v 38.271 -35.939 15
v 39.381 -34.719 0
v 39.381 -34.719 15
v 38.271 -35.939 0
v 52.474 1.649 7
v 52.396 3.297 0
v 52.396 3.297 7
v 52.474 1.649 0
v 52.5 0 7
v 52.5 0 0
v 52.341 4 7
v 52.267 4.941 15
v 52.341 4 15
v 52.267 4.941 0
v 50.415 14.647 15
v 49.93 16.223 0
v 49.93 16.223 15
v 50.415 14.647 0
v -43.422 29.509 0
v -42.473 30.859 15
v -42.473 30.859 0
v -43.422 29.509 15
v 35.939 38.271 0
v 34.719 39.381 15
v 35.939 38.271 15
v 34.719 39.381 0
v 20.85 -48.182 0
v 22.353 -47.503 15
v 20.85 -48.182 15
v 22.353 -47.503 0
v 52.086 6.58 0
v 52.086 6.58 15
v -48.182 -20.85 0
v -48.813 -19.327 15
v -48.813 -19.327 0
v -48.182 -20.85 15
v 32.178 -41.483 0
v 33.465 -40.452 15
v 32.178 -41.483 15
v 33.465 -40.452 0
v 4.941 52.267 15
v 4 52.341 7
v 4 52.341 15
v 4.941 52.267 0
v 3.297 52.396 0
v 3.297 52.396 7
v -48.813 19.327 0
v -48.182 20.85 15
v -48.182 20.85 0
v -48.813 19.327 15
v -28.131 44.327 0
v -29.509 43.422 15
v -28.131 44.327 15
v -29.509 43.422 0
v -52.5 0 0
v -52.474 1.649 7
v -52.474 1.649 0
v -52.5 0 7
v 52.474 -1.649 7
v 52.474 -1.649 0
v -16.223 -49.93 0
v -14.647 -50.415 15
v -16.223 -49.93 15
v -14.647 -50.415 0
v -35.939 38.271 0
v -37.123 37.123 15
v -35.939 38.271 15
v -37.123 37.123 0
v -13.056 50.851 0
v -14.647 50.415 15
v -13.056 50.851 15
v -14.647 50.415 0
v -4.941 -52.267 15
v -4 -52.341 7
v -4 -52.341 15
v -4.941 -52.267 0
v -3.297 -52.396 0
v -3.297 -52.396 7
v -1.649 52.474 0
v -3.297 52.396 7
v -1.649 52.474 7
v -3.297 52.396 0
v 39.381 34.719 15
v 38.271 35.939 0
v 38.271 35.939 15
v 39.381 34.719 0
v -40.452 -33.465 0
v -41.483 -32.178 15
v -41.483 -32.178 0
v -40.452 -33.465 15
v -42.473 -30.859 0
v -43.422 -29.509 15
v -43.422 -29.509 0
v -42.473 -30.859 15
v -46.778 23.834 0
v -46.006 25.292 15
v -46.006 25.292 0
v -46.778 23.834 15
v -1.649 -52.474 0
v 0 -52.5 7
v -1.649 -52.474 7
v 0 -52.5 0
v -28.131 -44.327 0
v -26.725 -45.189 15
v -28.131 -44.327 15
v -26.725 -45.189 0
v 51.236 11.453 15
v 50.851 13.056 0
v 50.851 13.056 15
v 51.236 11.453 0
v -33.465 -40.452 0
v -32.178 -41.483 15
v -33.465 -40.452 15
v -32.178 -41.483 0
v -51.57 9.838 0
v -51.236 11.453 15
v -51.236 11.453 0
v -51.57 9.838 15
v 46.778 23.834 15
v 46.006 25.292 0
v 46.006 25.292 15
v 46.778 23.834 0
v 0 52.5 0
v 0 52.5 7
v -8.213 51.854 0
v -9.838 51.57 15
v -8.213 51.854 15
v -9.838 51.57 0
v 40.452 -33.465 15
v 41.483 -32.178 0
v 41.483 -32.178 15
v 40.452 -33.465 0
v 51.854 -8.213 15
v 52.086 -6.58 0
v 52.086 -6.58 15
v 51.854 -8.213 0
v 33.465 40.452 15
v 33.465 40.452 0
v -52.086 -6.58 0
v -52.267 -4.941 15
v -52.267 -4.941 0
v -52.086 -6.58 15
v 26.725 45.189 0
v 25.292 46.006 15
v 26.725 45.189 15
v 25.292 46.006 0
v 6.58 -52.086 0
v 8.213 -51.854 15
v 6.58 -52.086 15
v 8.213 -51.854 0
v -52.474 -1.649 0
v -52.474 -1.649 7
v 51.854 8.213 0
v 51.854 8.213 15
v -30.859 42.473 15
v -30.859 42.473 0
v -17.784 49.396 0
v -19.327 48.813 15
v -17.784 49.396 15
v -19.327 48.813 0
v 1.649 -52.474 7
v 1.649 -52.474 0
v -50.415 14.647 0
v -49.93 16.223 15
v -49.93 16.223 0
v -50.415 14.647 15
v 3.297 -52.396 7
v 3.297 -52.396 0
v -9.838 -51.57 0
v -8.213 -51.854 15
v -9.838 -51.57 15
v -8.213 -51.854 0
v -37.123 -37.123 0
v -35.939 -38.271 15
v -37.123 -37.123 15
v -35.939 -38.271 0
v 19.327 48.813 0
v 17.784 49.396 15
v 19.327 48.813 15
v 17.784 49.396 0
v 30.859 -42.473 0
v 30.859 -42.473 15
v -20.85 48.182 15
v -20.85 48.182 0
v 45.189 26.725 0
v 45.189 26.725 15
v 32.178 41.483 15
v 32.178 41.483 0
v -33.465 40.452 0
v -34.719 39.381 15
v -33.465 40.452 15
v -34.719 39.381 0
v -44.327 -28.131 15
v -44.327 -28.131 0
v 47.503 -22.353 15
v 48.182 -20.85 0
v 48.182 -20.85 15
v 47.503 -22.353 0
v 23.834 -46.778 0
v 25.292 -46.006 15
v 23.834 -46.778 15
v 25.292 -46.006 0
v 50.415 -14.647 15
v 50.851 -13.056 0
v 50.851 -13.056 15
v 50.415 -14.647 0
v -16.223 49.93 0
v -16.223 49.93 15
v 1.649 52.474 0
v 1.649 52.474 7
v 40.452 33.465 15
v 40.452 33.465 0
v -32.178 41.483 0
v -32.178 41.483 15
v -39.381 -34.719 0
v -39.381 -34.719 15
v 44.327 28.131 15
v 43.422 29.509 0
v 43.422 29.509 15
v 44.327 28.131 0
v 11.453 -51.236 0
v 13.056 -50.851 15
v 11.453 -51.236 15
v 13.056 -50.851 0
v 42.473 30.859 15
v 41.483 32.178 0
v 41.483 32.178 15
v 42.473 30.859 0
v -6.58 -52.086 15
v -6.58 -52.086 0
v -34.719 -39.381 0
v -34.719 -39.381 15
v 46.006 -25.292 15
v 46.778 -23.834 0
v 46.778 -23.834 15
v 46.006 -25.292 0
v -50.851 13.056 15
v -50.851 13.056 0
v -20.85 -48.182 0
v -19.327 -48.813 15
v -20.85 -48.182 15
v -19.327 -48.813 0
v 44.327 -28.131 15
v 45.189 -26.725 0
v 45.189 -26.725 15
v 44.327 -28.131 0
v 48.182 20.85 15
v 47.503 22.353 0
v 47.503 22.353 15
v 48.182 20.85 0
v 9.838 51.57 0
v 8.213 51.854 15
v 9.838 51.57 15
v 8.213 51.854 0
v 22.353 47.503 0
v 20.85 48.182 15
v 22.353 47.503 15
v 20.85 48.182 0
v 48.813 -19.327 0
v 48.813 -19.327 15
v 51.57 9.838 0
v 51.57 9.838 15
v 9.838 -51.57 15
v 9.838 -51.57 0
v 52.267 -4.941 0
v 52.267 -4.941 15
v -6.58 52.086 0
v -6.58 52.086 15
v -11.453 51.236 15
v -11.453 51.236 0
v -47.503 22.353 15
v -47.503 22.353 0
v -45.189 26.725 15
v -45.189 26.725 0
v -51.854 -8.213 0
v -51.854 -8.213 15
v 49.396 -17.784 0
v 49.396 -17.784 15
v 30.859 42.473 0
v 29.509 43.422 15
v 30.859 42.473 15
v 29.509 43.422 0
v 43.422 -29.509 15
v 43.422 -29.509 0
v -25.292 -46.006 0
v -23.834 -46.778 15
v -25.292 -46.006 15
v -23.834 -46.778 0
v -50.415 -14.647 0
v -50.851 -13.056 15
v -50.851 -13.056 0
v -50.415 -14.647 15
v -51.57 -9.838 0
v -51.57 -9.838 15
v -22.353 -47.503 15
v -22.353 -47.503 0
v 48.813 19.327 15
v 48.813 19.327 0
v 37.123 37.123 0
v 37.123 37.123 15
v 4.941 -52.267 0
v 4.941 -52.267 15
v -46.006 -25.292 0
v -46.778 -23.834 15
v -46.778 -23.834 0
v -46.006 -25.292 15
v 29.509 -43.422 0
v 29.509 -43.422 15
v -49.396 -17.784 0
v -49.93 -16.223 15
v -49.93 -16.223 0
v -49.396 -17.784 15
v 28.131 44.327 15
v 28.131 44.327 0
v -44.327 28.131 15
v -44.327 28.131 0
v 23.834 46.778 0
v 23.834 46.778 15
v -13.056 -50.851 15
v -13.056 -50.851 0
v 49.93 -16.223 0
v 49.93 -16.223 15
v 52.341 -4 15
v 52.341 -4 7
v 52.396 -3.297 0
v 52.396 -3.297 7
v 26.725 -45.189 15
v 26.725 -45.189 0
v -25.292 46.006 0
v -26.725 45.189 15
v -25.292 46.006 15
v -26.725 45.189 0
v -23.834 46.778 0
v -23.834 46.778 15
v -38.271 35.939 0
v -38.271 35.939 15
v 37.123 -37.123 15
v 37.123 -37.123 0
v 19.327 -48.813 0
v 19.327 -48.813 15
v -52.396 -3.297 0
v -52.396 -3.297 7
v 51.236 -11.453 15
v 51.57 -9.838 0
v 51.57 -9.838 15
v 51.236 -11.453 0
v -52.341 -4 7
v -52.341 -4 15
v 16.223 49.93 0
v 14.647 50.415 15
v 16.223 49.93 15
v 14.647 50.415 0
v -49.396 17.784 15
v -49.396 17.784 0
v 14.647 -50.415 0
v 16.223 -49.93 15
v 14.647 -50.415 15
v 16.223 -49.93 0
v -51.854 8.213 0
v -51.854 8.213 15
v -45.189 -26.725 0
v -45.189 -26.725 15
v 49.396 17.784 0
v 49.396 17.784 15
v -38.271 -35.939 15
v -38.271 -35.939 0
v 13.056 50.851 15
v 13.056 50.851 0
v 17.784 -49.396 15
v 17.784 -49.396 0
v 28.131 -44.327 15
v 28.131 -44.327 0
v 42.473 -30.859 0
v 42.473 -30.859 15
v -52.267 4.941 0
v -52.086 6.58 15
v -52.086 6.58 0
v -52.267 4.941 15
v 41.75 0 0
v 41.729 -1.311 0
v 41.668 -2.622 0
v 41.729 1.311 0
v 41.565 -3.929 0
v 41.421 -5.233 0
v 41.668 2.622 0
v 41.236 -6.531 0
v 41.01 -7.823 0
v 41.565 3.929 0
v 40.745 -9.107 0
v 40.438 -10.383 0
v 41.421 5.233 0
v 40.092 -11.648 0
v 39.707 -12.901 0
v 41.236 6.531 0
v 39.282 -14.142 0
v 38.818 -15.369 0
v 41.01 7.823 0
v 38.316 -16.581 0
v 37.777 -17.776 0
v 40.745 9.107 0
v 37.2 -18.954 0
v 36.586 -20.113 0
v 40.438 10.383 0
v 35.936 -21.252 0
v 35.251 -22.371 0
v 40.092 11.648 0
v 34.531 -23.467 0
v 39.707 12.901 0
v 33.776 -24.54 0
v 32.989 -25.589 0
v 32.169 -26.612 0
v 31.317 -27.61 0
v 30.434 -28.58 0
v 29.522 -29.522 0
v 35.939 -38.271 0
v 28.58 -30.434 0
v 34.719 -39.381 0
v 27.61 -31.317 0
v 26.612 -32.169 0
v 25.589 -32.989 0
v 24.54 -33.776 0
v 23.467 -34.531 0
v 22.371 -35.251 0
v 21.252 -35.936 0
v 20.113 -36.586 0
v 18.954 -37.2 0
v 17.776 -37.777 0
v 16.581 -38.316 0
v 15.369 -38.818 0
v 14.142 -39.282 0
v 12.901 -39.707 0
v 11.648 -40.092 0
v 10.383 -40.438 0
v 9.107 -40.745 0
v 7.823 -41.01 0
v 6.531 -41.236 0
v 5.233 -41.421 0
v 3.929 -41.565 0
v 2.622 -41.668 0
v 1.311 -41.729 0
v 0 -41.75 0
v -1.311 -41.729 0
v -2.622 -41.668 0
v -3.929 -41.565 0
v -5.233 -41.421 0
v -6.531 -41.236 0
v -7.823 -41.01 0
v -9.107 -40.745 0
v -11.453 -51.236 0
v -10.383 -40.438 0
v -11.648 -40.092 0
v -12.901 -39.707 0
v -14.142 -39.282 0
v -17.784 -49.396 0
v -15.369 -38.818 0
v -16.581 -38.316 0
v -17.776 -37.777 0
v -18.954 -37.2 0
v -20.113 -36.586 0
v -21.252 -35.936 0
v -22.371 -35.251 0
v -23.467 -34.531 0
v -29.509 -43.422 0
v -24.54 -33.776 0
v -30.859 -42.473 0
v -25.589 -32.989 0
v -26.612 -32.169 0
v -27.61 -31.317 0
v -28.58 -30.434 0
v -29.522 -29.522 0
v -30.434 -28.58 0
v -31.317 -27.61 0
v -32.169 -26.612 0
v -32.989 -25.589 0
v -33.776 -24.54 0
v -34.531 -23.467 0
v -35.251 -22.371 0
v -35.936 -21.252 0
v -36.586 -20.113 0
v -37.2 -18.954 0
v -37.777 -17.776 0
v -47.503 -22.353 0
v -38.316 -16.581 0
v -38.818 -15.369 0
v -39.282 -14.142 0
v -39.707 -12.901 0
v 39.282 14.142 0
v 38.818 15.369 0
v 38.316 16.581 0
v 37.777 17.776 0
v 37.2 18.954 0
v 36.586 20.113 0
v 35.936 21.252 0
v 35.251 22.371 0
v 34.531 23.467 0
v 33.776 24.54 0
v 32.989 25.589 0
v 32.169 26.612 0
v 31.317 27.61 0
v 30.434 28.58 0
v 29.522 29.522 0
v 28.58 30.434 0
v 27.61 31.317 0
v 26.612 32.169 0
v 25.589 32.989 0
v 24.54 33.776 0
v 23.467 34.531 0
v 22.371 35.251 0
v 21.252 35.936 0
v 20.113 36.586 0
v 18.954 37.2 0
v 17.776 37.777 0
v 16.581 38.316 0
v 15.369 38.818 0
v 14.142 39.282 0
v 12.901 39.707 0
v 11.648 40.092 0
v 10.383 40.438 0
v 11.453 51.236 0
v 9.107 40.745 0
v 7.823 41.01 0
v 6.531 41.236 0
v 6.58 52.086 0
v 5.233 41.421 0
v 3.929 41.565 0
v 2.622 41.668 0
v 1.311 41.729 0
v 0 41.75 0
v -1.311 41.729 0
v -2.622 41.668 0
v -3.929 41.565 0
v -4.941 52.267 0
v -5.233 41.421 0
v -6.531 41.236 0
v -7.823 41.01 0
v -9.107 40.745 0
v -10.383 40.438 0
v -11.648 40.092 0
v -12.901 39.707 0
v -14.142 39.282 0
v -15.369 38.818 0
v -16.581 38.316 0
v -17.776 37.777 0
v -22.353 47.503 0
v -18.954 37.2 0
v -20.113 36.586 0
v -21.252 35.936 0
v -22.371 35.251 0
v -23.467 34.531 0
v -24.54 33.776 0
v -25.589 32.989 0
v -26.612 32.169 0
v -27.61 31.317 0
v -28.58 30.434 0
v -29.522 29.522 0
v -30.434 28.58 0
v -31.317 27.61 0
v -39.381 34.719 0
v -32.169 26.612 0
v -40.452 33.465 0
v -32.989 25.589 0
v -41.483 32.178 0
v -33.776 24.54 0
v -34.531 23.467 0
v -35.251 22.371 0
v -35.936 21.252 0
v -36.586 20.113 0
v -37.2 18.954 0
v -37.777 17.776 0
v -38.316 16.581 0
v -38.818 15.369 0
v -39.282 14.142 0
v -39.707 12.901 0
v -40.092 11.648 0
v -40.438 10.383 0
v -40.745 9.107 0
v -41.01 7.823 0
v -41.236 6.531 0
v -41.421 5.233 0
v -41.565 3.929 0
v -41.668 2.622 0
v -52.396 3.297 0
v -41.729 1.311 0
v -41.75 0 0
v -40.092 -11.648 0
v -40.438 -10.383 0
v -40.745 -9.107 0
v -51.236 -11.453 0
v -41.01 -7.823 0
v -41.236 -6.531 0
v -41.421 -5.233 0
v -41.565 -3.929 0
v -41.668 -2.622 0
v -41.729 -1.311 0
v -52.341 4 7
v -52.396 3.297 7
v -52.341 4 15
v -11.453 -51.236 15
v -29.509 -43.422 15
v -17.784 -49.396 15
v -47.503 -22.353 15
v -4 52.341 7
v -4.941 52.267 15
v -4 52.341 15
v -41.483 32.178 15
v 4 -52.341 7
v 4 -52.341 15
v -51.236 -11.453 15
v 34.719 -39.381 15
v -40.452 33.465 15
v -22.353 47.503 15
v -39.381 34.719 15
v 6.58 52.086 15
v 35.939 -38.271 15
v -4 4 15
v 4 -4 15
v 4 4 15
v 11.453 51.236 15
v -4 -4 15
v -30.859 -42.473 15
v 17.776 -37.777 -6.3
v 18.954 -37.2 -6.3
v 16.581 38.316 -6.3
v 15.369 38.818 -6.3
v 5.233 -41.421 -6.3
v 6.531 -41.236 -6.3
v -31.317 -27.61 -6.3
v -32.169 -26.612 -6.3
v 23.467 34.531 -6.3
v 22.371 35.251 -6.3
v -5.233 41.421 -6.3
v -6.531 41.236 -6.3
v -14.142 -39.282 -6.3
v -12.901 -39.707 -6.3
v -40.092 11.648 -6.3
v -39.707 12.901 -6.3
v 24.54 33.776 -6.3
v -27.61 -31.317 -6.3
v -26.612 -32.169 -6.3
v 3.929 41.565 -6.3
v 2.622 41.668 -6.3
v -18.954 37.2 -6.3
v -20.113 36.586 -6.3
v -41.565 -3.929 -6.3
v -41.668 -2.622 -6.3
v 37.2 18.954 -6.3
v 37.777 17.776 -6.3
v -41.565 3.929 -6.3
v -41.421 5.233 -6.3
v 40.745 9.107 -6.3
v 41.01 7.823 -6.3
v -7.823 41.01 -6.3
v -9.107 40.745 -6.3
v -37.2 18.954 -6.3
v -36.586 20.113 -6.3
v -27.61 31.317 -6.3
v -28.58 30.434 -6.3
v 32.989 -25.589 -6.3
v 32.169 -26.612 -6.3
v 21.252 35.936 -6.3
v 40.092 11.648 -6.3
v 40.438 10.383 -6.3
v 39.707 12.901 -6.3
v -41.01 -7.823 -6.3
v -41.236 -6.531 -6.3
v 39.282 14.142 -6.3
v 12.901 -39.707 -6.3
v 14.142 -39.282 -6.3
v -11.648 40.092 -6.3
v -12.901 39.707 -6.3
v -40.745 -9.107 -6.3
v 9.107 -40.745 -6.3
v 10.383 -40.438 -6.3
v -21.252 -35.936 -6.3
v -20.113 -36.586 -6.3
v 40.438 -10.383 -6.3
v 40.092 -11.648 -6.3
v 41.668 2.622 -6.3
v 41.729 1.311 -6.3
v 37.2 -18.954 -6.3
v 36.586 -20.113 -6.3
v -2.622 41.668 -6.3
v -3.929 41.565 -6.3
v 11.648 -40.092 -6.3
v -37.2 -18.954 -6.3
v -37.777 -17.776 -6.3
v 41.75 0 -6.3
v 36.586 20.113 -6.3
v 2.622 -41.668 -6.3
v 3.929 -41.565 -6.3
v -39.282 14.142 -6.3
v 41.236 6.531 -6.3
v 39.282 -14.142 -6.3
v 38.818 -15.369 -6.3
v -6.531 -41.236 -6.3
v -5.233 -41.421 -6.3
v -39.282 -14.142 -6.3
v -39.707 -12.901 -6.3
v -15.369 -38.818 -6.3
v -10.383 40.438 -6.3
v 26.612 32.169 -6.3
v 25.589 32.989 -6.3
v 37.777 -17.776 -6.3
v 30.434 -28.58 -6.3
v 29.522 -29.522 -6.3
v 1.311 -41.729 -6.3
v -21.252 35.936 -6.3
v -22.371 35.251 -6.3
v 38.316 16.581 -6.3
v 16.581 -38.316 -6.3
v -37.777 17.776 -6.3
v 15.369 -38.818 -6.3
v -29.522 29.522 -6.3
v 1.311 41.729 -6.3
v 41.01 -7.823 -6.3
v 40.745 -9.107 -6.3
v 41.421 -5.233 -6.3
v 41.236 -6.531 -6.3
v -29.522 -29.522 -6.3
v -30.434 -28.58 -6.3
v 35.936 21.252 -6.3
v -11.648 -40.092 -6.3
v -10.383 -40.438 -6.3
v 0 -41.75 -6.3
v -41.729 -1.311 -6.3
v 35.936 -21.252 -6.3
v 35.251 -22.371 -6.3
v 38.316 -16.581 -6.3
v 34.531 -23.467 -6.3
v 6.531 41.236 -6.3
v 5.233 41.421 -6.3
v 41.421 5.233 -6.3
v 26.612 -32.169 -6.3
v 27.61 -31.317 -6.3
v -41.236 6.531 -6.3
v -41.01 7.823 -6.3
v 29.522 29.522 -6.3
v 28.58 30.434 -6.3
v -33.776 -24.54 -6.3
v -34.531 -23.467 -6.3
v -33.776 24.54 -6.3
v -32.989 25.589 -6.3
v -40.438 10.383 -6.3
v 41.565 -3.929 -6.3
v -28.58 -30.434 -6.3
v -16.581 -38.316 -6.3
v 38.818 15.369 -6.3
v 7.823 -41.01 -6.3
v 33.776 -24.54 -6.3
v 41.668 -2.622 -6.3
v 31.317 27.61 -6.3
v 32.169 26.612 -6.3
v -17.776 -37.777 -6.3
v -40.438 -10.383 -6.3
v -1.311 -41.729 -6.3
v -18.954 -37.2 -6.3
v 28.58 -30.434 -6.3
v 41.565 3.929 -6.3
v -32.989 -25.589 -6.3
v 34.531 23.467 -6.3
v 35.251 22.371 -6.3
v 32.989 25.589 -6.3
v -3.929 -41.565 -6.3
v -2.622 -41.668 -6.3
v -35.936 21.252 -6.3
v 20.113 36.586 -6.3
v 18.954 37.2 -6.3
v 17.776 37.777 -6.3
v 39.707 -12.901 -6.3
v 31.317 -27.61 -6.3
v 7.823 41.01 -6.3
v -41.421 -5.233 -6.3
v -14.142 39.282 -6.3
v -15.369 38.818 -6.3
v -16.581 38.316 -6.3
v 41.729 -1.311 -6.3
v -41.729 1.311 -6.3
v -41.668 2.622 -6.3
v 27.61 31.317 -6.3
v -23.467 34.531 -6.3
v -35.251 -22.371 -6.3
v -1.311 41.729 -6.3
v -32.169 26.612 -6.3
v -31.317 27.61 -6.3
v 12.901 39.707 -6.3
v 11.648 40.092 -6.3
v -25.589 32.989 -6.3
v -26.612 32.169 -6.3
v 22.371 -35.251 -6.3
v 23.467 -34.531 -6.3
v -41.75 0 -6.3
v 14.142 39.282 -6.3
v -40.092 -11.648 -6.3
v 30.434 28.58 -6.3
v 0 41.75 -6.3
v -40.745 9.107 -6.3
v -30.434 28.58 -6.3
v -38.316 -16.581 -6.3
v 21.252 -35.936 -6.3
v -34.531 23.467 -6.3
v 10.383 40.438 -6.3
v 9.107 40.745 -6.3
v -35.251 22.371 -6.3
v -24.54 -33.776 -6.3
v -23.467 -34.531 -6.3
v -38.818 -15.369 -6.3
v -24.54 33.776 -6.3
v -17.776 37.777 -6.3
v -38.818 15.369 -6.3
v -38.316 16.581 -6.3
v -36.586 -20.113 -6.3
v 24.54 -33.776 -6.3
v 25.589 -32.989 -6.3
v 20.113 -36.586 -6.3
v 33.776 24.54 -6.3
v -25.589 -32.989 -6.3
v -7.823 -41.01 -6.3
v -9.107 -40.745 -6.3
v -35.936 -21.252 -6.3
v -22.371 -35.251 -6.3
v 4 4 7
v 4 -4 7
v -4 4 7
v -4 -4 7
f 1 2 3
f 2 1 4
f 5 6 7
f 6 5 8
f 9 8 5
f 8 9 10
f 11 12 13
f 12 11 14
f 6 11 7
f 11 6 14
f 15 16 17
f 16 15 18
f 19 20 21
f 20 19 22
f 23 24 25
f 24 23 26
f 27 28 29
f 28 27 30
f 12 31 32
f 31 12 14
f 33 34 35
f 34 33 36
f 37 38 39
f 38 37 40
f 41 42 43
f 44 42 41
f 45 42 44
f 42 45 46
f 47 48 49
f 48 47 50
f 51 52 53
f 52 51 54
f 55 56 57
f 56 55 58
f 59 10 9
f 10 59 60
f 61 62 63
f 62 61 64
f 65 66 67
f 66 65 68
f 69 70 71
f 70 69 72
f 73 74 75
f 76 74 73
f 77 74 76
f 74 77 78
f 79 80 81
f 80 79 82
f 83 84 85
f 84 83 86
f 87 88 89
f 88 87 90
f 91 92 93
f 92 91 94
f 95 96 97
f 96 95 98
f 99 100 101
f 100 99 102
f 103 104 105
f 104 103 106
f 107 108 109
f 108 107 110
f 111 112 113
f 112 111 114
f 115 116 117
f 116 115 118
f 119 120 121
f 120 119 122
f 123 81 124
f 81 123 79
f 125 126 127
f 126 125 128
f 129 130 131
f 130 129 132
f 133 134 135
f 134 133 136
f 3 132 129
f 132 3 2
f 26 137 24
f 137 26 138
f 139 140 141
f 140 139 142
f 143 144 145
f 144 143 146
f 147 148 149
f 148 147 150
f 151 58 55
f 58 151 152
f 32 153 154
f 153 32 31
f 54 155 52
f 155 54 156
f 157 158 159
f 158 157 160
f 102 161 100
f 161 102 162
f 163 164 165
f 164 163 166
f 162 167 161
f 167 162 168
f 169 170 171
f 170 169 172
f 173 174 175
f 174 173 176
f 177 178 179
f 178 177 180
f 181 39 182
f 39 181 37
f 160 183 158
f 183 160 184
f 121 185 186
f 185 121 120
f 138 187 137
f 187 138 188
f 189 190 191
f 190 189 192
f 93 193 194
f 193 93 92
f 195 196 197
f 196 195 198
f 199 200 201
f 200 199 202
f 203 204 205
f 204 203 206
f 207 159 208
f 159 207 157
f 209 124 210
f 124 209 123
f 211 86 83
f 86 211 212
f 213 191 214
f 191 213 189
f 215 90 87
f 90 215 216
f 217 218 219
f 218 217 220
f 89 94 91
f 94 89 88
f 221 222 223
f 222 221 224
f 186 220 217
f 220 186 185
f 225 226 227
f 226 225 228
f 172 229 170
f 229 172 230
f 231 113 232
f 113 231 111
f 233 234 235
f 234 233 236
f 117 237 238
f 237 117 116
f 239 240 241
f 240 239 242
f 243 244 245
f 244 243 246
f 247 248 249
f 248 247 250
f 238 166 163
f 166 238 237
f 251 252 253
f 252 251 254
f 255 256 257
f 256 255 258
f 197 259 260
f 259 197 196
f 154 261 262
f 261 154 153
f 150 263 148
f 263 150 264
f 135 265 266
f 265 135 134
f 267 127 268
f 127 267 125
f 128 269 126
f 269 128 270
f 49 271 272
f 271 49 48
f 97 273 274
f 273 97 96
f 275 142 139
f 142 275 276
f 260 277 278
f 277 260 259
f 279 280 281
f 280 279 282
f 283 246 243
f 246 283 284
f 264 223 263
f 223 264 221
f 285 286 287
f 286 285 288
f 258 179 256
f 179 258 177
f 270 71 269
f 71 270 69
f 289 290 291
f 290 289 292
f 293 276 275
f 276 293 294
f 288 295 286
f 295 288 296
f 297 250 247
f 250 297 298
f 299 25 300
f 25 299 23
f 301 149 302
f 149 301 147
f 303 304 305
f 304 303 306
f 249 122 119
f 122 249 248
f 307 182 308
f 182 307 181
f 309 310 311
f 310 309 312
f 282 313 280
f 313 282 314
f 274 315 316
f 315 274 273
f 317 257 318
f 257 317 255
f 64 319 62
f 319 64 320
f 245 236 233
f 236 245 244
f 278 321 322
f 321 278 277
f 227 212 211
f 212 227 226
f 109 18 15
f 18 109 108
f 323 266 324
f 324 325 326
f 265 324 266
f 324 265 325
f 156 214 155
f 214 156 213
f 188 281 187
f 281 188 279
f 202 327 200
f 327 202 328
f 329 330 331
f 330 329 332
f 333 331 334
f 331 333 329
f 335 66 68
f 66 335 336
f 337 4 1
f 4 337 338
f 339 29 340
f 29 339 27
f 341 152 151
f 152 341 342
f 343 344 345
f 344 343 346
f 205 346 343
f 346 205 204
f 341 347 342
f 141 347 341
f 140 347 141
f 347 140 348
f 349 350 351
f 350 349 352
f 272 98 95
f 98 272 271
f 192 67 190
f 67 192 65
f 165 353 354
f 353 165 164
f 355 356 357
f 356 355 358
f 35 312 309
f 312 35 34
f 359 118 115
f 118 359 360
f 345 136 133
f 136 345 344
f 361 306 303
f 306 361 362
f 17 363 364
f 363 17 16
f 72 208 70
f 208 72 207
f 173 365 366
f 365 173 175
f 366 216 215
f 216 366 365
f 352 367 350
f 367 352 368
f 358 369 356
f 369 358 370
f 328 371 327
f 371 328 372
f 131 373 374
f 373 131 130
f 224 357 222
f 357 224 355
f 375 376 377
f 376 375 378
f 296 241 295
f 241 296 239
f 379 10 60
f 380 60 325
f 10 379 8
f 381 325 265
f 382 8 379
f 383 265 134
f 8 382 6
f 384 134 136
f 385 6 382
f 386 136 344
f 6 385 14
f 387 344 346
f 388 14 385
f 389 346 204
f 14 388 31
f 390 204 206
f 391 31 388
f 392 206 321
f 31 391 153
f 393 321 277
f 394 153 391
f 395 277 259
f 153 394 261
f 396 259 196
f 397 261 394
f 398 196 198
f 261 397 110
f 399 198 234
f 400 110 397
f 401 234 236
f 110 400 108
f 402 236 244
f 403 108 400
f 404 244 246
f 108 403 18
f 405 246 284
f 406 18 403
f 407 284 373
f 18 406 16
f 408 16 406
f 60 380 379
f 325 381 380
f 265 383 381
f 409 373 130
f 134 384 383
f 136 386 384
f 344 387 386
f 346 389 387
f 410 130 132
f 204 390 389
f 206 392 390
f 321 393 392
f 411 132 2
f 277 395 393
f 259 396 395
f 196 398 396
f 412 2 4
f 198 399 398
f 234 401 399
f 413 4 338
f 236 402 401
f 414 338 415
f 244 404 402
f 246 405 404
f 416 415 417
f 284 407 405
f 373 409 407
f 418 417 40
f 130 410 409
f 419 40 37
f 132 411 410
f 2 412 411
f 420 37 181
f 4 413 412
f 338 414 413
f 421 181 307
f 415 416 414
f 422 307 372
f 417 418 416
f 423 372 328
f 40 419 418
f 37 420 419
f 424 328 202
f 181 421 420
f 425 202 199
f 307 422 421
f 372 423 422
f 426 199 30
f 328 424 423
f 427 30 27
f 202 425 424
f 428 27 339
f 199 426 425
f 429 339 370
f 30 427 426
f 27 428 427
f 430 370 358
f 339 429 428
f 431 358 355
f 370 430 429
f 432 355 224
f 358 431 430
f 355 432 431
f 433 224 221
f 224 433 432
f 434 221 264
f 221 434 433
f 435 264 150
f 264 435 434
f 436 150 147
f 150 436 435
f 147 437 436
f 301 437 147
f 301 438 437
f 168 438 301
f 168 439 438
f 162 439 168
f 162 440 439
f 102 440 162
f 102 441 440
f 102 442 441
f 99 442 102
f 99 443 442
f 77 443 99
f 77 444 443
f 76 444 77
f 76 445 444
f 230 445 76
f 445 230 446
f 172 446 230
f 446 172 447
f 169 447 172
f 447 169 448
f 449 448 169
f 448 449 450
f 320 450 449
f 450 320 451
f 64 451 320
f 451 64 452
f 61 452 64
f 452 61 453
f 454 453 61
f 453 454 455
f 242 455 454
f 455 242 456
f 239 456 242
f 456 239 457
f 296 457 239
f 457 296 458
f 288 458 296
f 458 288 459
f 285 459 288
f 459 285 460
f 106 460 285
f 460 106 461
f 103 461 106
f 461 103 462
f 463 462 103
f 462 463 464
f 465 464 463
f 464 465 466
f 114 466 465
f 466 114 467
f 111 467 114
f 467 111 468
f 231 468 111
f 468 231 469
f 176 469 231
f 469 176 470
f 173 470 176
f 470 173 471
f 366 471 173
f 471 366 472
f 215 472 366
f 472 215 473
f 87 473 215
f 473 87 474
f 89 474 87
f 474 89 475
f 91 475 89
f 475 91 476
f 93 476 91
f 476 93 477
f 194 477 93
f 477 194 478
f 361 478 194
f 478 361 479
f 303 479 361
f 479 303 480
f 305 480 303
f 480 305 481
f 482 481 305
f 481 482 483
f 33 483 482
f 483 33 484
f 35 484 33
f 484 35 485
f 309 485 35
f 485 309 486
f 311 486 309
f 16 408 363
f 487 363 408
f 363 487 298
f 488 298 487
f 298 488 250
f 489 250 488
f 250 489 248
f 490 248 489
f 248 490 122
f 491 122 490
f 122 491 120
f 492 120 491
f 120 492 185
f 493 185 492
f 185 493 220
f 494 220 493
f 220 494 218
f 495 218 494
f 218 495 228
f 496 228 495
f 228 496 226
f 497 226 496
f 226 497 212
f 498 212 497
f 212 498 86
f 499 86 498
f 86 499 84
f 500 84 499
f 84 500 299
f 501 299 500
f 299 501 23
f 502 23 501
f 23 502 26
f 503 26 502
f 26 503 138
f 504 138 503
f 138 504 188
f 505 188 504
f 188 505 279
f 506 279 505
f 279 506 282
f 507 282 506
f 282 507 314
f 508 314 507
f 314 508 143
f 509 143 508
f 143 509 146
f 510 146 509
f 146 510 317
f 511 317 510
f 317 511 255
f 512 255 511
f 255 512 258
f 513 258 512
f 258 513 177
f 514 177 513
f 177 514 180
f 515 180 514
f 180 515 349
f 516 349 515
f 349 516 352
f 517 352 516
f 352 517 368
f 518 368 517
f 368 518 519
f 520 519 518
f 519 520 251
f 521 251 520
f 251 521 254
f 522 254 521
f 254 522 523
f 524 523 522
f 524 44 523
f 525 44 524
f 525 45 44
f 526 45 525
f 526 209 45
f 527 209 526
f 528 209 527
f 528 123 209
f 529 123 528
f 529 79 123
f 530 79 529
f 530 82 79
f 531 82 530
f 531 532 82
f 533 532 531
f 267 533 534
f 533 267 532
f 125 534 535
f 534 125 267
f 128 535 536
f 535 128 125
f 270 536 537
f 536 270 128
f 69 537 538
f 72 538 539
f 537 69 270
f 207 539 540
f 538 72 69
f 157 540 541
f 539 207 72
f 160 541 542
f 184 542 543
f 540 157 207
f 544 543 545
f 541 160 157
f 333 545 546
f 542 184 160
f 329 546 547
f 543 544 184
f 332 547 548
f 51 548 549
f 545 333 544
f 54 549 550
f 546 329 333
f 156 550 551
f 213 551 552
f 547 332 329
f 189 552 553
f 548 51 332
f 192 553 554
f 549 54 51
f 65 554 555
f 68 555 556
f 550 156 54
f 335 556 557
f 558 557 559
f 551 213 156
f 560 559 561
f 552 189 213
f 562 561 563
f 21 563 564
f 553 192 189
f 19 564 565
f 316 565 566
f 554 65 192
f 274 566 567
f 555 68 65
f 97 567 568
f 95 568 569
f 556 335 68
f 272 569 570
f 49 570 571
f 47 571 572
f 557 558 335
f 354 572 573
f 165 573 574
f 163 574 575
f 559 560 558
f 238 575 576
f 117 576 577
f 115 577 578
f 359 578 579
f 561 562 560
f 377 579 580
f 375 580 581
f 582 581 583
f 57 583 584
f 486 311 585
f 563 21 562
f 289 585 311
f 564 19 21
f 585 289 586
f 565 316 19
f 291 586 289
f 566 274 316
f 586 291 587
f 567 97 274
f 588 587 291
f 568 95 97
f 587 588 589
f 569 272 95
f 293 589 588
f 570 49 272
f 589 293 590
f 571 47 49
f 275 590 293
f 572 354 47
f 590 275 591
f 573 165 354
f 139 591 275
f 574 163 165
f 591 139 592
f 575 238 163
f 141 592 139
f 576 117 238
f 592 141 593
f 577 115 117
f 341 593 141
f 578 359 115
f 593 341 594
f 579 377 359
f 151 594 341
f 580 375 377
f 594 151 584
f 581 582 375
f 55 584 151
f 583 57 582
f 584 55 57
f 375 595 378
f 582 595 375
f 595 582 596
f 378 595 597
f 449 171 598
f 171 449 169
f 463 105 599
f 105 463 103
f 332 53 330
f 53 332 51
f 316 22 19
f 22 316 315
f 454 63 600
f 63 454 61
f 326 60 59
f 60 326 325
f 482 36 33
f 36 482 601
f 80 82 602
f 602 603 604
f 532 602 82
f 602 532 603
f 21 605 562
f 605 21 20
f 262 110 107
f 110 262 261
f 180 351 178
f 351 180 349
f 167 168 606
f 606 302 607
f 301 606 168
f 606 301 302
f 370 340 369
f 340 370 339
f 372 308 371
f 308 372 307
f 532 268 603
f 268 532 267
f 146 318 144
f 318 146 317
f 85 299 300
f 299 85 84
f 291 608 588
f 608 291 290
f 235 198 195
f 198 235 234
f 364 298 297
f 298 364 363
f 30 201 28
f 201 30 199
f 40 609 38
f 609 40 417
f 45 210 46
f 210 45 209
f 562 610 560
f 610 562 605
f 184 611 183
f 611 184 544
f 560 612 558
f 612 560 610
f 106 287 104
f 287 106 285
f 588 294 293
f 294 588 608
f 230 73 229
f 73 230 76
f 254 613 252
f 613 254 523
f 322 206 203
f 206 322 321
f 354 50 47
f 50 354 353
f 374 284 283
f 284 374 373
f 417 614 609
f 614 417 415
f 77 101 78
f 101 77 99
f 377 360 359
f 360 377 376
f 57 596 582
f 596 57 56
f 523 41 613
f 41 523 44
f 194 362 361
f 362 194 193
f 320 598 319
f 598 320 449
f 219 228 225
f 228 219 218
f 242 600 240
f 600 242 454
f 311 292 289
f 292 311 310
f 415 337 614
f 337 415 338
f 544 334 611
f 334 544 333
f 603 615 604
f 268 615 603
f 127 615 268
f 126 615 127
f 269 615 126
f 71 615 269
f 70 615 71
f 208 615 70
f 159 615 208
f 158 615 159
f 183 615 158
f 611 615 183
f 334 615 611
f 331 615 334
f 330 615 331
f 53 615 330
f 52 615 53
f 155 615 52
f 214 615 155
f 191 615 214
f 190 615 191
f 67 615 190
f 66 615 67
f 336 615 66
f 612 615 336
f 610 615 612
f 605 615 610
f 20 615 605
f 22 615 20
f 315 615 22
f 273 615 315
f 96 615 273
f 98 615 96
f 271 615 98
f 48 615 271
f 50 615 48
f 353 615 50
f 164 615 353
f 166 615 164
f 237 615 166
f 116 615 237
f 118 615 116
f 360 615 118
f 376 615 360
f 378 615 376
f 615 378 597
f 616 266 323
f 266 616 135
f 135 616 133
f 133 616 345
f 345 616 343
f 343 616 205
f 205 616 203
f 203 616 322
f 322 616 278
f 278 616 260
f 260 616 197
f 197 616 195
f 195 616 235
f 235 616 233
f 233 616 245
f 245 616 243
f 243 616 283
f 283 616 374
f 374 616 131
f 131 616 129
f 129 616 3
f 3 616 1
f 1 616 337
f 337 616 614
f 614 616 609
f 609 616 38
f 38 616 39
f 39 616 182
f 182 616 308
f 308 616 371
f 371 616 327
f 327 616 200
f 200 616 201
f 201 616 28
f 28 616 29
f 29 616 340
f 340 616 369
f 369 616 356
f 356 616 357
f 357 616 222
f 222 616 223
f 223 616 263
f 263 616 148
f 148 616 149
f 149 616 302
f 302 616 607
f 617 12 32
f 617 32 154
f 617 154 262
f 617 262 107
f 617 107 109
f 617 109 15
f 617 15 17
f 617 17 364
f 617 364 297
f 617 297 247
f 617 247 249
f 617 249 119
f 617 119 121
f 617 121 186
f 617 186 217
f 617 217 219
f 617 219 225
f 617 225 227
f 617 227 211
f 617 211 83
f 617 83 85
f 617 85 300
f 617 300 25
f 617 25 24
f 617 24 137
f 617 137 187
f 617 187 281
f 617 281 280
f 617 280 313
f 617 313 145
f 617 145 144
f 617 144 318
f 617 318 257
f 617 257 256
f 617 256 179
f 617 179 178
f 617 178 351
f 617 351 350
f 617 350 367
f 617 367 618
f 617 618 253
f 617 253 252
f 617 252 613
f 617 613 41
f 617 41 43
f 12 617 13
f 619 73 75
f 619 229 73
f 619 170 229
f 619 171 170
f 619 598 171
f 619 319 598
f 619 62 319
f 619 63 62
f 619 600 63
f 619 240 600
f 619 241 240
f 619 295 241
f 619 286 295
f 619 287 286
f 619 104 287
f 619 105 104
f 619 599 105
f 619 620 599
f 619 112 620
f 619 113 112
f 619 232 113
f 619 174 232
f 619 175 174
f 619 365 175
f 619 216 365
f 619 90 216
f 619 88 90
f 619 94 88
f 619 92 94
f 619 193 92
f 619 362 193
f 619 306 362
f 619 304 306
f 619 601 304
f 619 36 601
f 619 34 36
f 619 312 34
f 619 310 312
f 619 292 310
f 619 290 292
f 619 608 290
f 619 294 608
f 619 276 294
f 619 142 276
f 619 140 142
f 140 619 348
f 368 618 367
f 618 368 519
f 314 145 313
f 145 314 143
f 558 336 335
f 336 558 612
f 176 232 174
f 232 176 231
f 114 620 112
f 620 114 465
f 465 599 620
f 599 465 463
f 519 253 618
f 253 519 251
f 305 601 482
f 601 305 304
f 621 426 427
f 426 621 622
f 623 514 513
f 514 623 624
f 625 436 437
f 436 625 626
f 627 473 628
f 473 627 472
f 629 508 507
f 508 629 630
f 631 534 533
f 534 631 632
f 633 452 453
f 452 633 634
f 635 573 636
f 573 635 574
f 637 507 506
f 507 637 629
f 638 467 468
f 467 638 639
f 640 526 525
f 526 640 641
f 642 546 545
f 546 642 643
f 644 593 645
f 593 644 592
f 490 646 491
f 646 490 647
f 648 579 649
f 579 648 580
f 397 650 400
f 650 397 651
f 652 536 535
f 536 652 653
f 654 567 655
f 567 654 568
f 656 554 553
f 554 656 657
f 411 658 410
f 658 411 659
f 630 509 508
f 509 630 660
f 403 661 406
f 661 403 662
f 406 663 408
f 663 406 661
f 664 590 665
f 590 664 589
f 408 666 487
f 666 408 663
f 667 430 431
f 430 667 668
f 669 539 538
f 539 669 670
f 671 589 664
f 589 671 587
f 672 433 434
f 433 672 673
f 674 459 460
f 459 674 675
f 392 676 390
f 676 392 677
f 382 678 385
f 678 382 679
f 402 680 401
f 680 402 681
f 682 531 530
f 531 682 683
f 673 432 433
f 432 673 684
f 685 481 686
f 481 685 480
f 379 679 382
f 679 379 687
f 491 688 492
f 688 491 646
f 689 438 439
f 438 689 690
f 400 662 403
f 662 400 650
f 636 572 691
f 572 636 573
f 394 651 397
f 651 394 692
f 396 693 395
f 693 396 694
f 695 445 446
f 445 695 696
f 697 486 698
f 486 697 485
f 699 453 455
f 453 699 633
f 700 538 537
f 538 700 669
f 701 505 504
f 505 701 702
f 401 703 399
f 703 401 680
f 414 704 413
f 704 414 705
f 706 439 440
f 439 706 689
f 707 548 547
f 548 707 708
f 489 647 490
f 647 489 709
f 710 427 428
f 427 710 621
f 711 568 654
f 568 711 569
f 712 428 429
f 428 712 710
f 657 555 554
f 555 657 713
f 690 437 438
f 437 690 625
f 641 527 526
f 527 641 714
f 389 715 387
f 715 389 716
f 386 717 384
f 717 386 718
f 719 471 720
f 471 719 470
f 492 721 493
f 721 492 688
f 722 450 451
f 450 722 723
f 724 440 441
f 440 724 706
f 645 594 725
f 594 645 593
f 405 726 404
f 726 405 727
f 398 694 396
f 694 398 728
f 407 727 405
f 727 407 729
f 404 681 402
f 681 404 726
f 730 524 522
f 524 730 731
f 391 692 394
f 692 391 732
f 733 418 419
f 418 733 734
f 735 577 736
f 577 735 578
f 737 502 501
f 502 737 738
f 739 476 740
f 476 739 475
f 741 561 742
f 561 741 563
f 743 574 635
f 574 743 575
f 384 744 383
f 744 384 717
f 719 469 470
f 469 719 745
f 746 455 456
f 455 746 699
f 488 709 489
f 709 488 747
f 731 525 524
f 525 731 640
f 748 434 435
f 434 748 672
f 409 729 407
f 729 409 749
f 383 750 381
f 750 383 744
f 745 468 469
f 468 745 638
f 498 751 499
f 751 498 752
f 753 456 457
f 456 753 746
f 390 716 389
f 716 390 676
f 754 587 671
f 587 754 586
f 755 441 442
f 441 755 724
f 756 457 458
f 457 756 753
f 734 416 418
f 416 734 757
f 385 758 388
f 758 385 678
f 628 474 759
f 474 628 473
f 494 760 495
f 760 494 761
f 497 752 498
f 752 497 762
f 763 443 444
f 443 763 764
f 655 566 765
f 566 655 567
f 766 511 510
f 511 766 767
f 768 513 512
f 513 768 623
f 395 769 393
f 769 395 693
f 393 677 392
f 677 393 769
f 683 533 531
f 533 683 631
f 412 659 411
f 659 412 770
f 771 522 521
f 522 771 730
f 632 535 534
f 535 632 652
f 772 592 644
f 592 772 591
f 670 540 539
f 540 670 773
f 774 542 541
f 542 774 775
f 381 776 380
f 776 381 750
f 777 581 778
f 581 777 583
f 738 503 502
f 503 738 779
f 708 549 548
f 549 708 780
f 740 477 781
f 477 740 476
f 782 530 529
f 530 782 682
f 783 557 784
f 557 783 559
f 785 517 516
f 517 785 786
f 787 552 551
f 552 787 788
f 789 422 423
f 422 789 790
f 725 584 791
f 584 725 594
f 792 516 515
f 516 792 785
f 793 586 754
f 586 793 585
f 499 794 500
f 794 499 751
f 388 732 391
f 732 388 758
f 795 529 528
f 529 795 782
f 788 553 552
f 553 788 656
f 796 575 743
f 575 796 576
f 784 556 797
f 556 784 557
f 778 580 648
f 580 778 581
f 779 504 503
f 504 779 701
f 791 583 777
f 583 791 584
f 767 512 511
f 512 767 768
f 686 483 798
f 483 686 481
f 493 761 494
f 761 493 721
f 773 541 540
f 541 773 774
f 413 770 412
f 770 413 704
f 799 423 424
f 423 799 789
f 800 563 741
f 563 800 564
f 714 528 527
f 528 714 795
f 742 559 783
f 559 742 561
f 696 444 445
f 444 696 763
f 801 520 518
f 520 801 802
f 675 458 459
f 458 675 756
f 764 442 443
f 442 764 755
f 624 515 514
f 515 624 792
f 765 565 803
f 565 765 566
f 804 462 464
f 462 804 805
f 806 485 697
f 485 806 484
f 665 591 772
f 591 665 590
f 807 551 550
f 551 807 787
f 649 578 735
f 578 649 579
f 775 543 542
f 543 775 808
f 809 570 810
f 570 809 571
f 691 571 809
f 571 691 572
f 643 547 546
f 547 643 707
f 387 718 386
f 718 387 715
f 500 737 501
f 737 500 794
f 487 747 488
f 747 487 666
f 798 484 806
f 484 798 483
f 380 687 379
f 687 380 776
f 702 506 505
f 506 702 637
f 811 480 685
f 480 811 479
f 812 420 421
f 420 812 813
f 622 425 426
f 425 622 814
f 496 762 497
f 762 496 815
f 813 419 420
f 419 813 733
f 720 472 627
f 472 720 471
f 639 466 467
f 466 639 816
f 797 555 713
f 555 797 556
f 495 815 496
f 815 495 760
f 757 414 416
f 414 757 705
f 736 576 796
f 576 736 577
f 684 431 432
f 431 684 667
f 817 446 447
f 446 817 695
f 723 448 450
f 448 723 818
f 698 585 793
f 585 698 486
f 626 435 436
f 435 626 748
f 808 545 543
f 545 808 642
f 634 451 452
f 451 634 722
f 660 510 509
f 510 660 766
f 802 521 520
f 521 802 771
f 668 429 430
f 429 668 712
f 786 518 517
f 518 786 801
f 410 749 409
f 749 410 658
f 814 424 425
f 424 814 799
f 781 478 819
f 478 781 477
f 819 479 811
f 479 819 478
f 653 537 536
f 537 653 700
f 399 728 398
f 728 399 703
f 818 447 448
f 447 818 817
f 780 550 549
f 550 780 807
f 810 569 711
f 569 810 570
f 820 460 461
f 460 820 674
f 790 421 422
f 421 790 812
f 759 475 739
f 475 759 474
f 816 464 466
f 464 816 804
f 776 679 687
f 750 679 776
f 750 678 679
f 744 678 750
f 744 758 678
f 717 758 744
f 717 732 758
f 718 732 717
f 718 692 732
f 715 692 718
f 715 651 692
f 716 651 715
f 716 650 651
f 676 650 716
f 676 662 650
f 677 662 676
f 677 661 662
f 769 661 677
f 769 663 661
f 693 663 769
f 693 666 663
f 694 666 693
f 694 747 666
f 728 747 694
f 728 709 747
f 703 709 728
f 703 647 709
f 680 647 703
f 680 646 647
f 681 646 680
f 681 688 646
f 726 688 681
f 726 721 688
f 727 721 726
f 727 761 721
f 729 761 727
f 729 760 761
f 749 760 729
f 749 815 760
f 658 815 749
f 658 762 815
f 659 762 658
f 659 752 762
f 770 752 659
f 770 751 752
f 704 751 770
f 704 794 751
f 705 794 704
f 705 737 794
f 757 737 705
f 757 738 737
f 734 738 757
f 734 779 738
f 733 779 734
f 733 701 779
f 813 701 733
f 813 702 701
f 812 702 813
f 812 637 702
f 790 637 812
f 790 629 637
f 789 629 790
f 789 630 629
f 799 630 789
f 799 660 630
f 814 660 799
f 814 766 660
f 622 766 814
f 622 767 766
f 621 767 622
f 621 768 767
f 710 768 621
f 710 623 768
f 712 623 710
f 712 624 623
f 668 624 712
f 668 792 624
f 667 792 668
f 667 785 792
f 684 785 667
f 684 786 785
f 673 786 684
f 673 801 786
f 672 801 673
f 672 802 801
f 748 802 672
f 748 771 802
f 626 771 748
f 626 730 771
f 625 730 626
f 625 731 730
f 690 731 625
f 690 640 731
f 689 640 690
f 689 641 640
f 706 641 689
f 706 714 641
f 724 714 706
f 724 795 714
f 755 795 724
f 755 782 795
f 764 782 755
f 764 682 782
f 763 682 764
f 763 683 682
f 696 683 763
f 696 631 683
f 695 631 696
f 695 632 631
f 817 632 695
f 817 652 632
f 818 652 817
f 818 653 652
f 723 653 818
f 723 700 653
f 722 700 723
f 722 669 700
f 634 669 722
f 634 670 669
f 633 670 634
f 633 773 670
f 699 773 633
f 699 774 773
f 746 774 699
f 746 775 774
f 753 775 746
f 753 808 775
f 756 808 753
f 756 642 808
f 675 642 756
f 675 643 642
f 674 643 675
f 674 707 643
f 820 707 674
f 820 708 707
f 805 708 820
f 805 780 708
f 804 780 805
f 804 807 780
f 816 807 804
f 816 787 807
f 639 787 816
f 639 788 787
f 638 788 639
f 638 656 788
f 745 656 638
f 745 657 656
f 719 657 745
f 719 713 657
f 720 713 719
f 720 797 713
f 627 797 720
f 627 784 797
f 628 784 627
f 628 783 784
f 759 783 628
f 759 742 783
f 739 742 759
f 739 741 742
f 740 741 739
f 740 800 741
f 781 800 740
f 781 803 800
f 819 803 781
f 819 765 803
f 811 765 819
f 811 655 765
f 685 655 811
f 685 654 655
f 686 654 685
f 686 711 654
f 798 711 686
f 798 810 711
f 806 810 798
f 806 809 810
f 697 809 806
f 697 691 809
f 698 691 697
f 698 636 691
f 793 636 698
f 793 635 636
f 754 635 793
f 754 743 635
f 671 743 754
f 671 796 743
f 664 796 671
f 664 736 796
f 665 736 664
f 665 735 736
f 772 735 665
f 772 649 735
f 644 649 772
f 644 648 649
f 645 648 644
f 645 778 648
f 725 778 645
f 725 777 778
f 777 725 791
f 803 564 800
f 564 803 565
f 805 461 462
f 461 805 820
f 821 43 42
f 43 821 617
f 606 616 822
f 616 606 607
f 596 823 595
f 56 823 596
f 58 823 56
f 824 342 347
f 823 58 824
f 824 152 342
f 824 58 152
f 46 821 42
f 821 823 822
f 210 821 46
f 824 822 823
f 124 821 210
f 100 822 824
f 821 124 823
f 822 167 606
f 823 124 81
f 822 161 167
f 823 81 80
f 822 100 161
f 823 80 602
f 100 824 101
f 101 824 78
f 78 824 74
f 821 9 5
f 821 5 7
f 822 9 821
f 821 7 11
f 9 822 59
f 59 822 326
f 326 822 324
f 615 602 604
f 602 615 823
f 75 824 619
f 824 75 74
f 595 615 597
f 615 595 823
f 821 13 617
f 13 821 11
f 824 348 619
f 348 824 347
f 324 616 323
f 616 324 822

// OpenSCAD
//Begin of user adjustable parameters...

//These parameters are defaulted for the... 
//Harbor Freight 1.5 ton jack.
//Adjust for your jack accordingly.
jackpad_bot_dia=83.5;
jackpad_top_dia=105;
jackpad_bot_height=6.3;

//This is the thickness of the top cylinder.
//If you are adding slots make sure this is "thicker"
//than the slot(s) height(s)
//For no slots I set this to 9
jackpad_top_height=15;

//set these to zero if you want just a flat top
//set channel_1 width/height for a single slot
//set channel_2 width/height for a cross slot
channel_1_width=8;
channel_1_height=8;
channel_2_width=8;
channel_2_height=8;

//End of user adjusted parameters...


jackpad_bot_rad=jackpad_bot_dia / 2.0;
jackpad_top_rad=jackpad_top_dia / 2.0;
    
difference(){    
union(){
	translate([0,0,(jackpad_top_height/2.0)]) {
        cylinder (h = jackpad_top_height, r=jackpad_top_rad, center = true, $fn=200);
        }
	translate([0,0,-(jackpad_bot_height/2.0)]) {
        cylinder (h = jackpad_bot_height, r=jackpad_bot_rad, center = true, $fn=200);
        }
     }  

union(){        
    translate([0,0,(((jackpad_top_height/2.0)-(channel_1_height/2.0))+(jackpad_top_height/2.0))]) {
        cube ([channel_1_height,(jackpad_top_dia+10),channel_1_height], center = true);
        }   
    translate([0,0,(((jackpad_top_height/2.0)-(channel_1_height/2.0))+(jackpad_top_height/2.0))]) {
        cube ([(jackpad_top_dia+10),channel_2_width,channel_2_height], center = true);
        }  
     }  
}
